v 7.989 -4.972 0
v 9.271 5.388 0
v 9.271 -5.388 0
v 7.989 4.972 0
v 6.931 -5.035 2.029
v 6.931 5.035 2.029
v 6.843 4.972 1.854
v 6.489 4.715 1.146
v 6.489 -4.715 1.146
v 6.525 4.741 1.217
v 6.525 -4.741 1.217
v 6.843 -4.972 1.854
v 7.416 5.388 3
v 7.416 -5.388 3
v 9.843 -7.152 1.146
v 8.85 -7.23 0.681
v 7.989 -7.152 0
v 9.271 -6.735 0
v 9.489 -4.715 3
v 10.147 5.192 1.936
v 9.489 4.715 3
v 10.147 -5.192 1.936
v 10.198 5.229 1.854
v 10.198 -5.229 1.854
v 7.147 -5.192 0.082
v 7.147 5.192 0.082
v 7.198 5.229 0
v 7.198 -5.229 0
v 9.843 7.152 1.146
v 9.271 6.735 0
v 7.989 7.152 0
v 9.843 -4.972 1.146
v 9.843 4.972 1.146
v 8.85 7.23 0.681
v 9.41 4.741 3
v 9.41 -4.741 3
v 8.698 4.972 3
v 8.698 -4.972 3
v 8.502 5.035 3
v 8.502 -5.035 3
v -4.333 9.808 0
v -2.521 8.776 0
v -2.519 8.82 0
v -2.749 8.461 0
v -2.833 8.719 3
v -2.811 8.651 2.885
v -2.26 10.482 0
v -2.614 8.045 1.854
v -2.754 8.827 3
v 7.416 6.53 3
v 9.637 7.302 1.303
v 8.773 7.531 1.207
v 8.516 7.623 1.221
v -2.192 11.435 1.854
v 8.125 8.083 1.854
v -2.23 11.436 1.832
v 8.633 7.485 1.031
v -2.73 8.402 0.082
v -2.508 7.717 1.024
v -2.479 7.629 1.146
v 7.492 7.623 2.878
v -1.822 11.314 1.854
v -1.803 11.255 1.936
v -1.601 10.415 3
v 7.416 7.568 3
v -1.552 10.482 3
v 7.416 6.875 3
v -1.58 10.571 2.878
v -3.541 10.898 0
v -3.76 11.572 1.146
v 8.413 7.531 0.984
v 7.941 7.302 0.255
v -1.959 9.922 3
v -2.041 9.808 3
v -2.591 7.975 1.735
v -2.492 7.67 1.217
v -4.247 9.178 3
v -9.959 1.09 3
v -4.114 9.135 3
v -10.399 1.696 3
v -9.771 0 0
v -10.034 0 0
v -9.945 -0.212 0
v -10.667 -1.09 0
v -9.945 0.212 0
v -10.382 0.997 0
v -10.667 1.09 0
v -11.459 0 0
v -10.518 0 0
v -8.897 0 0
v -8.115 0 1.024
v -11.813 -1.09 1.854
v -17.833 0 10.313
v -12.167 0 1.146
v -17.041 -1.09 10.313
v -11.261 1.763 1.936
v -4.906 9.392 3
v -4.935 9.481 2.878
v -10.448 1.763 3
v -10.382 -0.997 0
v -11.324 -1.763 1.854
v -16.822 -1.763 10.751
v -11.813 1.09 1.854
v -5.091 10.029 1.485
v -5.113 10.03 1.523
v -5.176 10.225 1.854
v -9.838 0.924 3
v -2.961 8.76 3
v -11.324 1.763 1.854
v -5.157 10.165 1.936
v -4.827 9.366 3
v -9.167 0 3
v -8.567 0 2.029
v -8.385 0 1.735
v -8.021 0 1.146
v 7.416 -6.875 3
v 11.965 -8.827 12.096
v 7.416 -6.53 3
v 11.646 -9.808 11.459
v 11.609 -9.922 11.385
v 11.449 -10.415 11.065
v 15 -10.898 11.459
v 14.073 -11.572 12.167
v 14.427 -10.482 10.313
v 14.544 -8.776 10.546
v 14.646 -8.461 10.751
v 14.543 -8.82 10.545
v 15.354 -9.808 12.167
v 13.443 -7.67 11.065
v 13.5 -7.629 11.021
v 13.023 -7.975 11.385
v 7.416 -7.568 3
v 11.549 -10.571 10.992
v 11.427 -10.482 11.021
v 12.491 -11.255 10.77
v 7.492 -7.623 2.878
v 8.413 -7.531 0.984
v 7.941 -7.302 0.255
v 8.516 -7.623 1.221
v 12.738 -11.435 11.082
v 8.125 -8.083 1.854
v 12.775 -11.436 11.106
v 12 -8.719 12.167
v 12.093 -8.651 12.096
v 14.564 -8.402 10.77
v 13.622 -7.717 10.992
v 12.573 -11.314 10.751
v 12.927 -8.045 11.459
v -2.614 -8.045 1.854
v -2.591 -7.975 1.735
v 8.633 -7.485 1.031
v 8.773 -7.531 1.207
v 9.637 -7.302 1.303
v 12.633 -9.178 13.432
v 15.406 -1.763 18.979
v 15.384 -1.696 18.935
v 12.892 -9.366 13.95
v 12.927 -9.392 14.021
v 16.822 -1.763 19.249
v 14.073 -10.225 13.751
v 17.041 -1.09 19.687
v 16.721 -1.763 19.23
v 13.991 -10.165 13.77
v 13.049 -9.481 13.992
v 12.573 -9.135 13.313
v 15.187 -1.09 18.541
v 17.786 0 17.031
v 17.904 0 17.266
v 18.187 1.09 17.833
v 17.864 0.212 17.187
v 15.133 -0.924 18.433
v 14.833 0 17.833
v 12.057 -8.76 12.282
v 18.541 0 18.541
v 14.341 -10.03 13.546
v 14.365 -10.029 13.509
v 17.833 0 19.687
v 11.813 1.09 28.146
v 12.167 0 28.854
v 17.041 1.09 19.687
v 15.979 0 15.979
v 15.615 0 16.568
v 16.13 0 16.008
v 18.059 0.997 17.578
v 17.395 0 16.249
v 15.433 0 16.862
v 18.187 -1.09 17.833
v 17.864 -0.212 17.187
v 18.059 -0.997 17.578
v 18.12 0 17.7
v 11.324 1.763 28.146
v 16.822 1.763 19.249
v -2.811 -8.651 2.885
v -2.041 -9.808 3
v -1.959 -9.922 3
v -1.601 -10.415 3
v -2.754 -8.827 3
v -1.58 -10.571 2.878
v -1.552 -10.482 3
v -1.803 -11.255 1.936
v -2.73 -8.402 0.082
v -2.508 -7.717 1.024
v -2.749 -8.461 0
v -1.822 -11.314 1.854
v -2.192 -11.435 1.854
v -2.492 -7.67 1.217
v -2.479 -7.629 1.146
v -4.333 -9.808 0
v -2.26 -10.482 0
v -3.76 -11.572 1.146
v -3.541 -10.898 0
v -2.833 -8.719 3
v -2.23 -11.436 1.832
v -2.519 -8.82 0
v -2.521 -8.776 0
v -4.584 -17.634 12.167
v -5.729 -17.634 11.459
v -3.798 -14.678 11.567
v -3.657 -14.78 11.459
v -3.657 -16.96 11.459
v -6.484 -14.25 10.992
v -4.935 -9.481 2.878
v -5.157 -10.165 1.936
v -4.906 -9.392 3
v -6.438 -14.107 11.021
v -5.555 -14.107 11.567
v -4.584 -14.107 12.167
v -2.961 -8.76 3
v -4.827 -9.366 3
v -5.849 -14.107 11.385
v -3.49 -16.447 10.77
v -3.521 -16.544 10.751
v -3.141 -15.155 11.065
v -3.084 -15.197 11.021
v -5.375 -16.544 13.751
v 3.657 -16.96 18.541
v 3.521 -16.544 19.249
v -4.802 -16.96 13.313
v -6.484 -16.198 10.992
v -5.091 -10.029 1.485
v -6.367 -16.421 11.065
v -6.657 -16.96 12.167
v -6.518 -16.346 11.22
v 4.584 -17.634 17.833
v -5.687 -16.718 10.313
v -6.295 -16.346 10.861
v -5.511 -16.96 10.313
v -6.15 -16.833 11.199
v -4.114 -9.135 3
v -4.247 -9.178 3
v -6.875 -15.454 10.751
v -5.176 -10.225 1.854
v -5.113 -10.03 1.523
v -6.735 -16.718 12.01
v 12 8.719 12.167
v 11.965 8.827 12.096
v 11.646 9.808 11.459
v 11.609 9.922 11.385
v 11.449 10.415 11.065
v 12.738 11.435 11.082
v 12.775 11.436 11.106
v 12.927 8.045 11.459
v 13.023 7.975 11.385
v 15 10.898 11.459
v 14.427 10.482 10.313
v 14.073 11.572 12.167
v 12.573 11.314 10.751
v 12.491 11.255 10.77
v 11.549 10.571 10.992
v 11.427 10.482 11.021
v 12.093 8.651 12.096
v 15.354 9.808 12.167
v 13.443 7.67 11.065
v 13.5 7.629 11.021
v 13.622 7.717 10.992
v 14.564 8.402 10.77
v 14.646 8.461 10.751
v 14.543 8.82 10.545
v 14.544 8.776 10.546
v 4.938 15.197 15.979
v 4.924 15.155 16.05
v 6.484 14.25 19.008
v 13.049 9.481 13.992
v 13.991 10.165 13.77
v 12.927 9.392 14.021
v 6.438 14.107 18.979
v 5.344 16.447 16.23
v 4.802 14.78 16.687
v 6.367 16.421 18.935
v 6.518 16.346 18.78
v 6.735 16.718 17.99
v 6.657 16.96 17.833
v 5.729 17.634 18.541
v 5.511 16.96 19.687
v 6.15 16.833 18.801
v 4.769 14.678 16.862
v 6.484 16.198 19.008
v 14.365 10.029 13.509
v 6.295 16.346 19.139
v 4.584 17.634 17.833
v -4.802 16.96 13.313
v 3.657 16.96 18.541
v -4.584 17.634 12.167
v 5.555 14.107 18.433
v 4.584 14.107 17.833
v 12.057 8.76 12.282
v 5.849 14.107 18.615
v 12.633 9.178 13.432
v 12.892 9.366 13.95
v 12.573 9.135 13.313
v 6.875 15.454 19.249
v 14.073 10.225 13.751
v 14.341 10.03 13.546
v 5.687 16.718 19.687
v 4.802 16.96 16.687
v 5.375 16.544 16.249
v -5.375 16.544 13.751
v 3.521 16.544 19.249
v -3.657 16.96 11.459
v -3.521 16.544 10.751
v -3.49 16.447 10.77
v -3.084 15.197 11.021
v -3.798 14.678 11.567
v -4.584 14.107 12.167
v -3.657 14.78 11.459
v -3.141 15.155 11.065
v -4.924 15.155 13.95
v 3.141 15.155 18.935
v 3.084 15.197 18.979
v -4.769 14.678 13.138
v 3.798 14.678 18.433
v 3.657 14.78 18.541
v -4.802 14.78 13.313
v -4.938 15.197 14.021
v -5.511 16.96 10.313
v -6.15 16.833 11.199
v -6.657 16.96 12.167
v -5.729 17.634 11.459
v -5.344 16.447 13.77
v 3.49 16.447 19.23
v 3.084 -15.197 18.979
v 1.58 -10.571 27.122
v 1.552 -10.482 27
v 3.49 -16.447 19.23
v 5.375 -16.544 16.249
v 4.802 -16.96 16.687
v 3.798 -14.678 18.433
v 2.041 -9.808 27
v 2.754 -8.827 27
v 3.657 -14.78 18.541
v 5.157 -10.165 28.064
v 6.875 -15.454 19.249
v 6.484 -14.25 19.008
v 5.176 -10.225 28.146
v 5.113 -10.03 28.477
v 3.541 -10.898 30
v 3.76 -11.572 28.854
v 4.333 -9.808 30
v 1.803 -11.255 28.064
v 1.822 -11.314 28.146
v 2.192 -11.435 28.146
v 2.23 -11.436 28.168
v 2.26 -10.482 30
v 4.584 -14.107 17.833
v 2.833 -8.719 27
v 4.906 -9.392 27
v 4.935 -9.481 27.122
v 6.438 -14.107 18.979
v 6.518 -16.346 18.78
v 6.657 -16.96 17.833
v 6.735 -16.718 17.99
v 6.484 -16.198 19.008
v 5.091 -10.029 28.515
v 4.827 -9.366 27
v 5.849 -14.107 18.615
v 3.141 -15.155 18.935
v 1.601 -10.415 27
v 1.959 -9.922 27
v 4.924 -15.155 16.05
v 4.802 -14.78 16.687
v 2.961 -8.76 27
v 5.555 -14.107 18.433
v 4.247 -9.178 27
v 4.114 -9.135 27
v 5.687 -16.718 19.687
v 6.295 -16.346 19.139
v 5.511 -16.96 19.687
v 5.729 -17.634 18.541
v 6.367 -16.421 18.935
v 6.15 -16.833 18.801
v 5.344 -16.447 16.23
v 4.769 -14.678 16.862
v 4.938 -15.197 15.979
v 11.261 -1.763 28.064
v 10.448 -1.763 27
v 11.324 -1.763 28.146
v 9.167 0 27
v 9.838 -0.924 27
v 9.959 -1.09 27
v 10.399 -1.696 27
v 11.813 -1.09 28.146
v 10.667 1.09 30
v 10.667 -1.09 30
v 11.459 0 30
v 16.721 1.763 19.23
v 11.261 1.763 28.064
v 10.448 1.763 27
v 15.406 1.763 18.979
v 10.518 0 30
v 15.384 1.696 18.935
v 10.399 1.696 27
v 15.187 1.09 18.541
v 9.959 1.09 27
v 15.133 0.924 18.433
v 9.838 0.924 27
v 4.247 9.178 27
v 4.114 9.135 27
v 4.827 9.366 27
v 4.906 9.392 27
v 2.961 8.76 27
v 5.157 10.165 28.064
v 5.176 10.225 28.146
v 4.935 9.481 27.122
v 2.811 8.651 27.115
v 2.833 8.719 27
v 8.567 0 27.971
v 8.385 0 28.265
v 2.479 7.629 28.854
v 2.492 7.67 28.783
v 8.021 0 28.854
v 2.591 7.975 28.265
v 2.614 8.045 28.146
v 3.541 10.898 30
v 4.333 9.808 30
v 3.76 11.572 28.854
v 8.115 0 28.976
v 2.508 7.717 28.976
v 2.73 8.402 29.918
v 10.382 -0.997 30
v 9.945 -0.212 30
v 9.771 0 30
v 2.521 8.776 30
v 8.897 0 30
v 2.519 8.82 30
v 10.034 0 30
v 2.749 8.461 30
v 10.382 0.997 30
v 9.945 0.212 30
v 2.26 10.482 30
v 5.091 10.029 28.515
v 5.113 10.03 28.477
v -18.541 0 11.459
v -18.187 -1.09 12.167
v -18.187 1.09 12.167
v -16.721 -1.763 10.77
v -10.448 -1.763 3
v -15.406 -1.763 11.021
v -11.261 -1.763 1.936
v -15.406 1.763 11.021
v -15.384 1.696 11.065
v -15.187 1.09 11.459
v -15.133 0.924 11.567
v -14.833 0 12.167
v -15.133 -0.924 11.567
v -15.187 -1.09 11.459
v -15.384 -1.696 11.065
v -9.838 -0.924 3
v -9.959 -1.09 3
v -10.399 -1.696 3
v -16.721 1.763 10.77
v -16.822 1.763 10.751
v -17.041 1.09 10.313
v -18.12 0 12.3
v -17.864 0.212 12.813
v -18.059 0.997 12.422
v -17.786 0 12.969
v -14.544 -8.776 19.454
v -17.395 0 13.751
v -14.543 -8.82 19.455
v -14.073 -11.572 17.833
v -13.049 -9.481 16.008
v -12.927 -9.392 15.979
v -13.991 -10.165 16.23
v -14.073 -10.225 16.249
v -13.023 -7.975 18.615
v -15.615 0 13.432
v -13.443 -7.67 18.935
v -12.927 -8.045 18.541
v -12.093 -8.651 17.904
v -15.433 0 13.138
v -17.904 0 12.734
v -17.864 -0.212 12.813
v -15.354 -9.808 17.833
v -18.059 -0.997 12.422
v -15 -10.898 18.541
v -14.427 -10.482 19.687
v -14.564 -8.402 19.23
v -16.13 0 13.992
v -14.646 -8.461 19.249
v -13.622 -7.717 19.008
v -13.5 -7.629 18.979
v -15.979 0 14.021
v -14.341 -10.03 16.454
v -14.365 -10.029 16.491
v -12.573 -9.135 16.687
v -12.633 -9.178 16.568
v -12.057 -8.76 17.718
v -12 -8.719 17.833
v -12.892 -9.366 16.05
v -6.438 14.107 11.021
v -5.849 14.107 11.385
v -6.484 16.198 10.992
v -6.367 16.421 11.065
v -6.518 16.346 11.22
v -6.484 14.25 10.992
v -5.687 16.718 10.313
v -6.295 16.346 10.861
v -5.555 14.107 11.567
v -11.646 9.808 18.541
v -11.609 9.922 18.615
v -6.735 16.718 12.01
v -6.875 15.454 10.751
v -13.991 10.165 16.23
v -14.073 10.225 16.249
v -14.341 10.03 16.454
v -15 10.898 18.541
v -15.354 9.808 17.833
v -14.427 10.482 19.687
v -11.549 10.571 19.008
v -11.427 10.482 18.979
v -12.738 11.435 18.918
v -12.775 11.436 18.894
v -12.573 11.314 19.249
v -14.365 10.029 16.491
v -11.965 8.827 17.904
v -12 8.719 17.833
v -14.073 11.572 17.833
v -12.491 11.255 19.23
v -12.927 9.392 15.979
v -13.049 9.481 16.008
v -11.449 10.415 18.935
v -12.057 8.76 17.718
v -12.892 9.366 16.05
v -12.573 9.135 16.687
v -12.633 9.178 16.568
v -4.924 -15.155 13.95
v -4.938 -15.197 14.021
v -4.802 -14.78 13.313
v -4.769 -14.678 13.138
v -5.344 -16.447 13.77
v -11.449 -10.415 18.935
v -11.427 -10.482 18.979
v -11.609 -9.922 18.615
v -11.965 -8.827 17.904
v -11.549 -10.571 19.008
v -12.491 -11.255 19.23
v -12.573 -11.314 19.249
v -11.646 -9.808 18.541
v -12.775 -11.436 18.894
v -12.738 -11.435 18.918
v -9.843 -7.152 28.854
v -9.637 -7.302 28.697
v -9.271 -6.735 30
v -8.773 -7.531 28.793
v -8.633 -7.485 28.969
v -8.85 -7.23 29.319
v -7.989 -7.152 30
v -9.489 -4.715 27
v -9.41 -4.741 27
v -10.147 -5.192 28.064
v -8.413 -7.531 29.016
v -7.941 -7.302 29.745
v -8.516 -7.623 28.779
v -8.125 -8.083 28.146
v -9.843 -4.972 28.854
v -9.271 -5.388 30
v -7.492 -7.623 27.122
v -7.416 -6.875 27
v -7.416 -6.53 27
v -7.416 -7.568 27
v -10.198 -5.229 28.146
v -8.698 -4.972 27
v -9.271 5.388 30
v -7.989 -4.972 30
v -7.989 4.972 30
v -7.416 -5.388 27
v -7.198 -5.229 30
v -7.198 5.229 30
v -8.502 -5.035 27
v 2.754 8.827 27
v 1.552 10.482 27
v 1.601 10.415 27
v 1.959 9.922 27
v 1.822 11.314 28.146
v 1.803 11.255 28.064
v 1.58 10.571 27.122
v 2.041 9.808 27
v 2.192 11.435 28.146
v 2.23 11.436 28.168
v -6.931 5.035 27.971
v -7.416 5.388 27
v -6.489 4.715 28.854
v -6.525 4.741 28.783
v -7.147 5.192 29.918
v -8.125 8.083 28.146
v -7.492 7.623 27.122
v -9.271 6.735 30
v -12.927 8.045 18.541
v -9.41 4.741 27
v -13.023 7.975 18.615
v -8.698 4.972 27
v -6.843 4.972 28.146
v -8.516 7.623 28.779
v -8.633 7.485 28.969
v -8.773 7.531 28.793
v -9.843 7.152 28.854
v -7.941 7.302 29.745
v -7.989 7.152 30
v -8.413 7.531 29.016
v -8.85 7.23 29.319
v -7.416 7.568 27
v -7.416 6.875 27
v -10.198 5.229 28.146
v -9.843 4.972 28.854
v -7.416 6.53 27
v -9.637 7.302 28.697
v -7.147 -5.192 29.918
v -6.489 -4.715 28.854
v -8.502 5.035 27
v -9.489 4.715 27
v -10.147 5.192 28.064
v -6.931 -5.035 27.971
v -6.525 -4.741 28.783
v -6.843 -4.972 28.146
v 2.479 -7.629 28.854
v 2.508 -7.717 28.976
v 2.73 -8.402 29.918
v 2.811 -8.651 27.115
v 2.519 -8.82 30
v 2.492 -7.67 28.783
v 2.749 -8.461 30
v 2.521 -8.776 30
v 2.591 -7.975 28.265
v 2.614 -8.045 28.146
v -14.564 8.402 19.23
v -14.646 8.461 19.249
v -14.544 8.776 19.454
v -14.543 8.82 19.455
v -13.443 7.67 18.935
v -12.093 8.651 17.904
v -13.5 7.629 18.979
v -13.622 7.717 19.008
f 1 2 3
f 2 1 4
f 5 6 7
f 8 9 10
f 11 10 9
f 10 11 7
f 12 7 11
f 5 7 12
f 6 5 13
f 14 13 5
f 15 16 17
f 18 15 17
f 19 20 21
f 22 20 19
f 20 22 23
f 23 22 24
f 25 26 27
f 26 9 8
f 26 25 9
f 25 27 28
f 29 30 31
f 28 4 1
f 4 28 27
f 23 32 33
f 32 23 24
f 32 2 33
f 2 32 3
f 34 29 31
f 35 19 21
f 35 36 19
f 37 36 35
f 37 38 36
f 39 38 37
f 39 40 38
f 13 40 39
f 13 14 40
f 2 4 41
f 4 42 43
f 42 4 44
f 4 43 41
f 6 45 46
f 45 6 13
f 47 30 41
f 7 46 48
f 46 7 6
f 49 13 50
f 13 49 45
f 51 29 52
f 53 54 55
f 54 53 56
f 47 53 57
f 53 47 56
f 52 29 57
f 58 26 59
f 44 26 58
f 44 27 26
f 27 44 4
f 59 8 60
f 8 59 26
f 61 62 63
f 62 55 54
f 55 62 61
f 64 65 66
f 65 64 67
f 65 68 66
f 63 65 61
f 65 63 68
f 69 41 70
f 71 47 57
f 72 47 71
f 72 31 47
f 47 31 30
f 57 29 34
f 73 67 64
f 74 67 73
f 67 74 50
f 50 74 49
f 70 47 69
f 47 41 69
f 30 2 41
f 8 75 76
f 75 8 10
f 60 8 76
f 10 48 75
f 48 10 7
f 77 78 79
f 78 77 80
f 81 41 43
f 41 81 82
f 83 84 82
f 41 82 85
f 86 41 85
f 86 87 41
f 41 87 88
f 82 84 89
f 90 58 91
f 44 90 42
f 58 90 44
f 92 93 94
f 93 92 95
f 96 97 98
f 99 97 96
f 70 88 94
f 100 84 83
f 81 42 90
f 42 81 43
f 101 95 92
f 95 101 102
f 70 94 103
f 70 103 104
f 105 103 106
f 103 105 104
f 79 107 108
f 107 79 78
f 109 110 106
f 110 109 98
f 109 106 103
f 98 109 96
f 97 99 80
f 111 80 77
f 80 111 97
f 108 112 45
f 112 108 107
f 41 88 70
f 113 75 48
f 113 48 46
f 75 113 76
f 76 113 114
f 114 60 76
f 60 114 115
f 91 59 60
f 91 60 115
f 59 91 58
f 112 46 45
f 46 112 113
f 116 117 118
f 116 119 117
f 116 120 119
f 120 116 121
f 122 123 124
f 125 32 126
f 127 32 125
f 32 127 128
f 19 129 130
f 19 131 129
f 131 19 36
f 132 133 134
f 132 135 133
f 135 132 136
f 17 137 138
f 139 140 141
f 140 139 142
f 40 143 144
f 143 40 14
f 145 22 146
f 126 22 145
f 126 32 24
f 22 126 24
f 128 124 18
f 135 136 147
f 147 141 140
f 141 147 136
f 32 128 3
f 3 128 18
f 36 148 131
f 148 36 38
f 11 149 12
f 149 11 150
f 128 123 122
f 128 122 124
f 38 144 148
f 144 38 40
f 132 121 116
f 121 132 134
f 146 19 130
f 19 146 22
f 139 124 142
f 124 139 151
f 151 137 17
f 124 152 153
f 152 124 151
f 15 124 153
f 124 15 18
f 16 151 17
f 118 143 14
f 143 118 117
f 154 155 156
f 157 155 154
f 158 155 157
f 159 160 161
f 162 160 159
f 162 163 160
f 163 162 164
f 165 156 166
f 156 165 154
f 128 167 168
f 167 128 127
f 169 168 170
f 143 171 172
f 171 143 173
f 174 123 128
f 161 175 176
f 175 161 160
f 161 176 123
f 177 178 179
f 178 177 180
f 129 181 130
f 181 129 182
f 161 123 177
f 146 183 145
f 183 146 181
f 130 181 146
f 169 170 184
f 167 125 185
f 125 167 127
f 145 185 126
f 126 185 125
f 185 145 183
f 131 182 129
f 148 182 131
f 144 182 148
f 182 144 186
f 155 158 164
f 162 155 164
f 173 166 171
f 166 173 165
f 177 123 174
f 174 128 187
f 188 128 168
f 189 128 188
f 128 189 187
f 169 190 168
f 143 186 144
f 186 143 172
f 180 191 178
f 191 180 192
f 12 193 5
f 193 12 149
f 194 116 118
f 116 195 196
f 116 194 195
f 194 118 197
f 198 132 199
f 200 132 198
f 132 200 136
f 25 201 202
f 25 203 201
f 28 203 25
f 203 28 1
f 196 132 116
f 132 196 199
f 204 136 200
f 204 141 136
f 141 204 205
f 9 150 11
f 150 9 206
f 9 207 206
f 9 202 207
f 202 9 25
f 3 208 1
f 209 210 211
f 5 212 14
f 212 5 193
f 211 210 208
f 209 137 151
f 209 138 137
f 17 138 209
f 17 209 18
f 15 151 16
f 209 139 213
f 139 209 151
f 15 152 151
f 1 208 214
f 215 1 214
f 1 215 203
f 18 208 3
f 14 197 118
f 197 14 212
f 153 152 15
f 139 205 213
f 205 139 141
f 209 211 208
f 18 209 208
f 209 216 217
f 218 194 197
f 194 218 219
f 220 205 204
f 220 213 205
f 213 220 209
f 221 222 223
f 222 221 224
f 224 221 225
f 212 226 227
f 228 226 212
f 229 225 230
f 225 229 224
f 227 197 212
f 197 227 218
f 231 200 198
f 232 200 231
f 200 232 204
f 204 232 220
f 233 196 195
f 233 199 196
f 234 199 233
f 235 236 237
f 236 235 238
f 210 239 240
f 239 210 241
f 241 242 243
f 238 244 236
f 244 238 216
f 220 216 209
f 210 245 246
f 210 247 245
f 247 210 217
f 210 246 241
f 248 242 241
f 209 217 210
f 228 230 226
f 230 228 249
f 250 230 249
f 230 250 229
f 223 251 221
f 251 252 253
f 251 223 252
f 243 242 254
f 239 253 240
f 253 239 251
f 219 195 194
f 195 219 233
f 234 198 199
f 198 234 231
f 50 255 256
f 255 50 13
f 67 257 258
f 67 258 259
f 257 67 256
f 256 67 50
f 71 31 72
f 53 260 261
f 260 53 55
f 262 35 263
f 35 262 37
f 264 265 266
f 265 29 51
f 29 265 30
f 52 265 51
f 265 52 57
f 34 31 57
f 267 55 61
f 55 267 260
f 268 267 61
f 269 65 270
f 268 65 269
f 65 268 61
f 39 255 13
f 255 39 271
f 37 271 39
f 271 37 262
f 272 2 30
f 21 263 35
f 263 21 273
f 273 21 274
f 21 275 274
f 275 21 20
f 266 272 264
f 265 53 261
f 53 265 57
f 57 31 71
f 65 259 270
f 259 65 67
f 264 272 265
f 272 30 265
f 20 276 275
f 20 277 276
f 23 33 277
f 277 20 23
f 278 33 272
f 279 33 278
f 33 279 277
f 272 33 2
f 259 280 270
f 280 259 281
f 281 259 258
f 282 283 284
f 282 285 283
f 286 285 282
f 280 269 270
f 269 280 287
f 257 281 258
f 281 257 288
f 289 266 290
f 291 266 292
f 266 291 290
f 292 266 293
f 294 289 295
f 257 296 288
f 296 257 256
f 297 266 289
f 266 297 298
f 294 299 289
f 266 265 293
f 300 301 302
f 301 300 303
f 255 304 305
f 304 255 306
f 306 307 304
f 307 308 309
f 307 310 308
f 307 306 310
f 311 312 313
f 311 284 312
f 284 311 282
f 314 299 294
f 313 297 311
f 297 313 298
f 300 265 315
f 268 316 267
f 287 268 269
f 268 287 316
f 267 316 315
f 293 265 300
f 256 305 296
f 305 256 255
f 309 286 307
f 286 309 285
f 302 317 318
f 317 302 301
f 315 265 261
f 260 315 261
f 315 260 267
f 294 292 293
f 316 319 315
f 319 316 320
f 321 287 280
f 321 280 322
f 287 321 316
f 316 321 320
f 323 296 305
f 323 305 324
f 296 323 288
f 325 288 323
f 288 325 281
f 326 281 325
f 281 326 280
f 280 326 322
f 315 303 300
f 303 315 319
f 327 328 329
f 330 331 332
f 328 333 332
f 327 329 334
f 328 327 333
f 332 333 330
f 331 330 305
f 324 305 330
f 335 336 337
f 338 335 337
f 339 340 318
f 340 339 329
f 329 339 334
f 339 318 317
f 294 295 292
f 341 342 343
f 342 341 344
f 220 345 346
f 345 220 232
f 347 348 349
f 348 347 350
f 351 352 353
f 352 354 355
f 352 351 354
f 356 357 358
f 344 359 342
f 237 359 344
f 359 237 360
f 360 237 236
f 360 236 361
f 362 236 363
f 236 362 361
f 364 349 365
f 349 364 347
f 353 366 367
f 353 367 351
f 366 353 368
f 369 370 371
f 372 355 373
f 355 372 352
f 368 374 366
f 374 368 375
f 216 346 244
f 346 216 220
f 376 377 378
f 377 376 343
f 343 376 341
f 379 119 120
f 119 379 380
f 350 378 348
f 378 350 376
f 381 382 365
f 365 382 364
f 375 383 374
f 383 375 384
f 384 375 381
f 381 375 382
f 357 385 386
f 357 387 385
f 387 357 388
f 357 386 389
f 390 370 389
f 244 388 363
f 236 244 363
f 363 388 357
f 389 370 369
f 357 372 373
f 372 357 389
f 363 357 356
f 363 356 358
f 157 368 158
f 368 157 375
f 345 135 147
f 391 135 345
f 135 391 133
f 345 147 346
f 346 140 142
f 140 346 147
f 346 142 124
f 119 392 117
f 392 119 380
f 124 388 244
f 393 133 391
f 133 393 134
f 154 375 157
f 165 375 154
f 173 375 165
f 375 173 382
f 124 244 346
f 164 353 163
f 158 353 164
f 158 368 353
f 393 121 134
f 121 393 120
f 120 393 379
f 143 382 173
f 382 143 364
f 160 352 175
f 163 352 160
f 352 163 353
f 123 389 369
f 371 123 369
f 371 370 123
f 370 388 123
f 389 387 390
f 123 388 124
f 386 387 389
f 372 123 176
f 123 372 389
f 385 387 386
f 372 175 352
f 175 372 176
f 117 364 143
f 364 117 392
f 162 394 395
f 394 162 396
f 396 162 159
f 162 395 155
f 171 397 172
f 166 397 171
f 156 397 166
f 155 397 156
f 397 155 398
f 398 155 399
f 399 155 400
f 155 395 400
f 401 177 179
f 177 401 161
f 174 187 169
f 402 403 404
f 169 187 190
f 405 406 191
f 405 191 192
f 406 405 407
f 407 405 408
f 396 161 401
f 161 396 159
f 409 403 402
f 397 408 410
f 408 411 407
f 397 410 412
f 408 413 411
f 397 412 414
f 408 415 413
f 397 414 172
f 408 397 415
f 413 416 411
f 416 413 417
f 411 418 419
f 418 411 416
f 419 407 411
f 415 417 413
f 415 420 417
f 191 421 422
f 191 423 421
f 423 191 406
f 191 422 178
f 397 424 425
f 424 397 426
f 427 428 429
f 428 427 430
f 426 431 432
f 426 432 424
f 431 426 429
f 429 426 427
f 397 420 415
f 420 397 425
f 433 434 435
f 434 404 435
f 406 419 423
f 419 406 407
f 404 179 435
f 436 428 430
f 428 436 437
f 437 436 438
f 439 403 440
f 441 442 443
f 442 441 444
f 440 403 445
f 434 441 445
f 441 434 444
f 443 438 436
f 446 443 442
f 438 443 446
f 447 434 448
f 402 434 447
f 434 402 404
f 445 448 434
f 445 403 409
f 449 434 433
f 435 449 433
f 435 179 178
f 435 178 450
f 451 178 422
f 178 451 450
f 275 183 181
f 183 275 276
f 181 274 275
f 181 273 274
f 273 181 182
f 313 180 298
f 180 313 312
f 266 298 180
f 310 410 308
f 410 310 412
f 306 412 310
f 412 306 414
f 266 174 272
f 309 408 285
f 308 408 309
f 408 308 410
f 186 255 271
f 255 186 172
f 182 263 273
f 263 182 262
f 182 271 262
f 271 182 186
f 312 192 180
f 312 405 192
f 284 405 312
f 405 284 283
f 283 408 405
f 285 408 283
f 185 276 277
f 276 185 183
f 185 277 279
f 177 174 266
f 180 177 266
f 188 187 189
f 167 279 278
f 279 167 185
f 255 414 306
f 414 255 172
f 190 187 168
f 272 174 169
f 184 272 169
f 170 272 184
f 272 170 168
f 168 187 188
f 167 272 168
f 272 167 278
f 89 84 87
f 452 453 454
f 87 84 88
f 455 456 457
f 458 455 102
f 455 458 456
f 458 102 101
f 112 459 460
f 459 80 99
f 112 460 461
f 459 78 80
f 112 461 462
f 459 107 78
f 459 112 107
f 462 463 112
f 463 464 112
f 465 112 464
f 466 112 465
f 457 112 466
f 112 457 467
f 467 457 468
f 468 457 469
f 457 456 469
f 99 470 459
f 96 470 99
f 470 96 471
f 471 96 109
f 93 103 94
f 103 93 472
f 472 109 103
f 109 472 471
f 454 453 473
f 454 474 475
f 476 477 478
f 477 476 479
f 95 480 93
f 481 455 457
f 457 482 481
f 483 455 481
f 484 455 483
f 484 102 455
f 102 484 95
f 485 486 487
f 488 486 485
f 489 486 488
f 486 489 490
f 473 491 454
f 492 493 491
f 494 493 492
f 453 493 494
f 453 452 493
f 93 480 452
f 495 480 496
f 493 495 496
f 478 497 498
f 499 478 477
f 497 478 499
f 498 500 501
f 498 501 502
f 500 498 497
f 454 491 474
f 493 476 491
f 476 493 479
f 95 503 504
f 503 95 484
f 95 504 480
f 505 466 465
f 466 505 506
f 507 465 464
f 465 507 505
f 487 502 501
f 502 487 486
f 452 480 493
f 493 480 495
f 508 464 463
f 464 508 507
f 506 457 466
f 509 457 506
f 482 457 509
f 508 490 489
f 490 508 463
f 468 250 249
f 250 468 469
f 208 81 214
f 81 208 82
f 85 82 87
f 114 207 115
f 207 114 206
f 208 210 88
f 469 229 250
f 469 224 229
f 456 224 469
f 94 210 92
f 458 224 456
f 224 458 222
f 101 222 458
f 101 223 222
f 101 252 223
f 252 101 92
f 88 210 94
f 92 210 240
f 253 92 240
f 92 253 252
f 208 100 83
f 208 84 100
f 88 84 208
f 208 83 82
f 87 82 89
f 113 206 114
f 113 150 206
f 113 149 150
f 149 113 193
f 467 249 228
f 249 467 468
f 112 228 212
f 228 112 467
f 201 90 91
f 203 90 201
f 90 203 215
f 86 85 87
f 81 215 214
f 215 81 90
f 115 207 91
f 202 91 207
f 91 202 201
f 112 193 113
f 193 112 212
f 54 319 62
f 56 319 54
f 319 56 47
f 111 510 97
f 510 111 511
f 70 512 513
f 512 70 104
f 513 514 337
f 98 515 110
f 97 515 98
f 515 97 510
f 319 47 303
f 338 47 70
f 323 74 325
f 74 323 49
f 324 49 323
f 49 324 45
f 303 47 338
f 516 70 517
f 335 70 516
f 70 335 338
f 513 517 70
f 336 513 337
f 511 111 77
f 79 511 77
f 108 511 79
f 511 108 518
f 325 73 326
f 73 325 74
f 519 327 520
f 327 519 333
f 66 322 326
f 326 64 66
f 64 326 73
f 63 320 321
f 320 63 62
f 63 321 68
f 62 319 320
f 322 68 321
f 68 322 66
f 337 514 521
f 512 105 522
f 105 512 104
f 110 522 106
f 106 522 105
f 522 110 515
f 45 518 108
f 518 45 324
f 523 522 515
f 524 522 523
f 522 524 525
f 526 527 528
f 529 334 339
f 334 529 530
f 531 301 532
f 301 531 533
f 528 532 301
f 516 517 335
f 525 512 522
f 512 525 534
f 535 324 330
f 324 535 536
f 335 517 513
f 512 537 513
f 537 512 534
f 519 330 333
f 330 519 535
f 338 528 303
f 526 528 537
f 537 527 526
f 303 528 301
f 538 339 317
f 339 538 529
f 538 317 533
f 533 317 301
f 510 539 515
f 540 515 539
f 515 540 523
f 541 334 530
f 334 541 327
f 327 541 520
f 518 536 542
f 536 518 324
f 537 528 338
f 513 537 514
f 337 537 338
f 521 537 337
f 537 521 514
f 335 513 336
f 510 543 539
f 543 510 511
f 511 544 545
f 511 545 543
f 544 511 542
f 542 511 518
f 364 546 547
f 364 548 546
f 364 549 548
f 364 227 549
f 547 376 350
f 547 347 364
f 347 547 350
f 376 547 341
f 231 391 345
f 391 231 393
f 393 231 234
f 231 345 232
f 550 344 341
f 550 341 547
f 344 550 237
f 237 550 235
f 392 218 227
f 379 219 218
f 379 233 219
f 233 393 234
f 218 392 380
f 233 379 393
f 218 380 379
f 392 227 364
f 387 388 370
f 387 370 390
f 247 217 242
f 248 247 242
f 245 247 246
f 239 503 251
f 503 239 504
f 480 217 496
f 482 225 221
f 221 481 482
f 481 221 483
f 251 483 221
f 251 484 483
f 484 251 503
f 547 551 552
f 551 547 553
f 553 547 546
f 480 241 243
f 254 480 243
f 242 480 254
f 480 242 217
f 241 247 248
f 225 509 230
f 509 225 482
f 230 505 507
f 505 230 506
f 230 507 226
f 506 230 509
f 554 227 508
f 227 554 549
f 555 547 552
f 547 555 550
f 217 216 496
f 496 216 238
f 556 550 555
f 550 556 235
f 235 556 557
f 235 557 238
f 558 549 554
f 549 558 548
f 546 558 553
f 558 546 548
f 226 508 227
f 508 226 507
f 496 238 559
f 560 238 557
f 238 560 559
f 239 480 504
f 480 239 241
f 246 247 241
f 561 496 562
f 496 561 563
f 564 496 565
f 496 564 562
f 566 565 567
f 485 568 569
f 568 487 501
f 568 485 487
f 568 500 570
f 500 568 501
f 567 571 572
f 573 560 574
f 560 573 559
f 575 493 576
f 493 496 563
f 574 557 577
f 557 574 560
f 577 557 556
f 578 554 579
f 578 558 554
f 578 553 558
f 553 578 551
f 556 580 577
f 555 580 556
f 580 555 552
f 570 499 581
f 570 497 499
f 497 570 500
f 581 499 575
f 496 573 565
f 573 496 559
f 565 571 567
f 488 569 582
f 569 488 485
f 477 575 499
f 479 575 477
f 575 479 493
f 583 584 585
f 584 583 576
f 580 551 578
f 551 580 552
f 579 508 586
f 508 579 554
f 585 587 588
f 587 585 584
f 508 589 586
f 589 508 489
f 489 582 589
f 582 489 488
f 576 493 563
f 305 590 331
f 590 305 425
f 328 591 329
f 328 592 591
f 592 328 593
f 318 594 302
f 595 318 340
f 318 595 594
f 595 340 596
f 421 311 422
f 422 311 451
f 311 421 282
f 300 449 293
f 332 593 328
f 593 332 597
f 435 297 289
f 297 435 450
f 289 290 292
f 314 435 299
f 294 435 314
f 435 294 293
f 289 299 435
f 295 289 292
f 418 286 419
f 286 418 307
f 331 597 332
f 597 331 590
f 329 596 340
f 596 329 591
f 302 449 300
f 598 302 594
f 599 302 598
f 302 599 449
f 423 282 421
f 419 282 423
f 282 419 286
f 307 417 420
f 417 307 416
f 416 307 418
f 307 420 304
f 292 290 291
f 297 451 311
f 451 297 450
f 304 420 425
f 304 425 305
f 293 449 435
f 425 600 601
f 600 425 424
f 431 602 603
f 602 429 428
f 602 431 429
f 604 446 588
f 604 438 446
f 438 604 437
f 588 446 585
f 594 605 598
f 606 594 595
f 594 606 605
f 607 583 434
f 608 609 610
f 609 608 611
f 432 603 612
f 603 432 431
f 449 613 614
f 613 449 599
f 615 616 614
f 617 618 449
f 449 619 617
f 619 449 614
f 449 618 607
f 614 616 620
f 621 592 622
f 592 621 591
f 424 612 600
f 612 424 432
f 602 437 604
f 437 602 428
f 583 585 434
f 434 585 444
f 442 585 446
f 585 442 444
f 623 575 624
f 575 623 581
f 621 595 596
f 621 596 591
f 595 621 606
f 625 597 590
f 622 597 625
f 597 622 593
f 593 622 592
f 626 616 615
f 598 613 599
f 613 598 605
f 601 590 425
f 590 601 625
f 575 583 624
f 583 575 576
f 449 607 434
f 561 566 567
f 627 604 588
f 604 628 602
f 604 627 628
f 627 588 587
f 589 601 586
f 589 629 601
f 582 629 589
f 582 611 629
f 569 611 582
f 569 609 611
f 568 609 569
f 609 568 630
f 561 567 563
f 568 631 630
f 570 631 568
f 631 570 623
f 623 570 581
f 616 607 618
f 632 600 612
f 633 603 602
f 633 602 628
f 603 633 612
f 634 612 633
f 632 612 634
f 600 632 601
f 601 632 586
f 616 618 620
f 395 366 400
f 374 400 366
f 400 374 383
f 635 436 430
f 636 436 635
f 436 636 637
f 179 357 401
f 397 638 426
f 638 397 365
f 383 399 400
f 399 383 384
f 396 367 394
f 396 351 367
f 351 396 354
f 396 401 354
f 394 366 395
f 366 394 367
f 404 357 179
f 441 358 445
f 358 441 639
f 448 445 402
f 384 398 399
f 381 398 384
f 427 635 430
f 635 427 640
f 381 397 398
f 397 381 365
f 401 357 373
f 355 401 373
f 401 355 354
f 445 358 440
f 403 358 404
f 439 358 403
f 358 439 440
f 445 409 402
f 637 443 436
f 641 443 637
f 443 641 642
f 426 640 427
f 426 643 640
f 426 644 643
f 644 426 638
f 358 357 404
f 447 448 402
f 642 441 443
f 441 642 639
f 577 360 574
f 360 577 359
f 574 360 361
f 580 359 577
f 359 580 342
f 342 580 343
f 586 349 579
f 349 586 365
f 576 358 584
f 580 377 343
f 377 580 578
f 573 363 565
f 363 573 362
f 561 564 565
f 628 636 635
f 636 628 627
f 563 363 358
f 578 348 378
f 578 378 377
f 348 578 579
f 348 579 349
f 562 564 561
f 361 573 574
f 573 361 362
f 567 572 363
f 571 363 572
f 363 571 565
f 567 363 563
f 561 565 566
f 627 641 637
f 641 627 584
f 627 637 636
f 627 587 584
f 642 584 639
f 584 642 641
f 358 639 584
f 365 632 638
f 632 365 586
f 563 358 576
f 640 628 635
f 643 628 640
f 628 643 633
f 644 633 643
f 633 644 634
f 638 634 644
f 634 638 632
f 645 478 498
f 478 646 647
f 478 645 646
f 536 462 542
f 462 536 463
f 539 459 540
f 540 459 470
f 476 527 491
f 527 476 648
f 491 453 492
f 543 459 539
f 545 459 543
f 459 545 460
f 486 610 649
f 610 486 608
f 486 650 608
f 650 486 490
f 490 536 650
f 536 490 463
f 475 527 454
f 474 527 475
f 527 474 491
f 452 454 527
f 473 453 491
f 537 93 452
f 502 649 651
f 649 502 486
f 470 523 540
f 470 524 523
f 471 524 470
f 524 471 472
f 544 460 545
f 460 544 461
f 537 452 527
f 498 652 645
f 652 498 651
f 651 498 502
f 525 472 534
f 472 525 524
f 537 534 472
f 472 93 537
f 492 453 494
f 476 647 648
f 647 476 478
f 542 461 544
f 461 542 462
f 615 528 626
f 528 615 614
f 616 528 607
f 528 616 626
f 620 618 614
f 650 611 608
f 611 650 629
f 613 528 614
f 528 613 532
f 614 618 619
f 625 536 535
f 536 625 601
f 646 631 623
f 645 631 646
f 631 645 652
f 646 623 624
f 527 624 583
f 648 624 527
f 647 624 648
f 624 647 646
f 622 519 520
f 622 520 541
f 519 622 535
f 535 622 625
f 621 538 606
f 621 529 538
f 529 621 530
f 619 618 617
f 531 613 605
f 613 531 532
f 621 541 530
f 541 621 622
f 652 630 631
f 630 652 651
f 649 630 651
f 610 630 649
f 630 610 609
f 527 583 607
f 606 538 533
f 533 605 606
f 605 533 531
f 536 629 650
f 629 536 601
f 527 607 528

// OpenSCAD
// shape height
sh = 30;
// border width
bw = 3;

include <polyhedra.scad>;

poly_wire(dodecahedron);
